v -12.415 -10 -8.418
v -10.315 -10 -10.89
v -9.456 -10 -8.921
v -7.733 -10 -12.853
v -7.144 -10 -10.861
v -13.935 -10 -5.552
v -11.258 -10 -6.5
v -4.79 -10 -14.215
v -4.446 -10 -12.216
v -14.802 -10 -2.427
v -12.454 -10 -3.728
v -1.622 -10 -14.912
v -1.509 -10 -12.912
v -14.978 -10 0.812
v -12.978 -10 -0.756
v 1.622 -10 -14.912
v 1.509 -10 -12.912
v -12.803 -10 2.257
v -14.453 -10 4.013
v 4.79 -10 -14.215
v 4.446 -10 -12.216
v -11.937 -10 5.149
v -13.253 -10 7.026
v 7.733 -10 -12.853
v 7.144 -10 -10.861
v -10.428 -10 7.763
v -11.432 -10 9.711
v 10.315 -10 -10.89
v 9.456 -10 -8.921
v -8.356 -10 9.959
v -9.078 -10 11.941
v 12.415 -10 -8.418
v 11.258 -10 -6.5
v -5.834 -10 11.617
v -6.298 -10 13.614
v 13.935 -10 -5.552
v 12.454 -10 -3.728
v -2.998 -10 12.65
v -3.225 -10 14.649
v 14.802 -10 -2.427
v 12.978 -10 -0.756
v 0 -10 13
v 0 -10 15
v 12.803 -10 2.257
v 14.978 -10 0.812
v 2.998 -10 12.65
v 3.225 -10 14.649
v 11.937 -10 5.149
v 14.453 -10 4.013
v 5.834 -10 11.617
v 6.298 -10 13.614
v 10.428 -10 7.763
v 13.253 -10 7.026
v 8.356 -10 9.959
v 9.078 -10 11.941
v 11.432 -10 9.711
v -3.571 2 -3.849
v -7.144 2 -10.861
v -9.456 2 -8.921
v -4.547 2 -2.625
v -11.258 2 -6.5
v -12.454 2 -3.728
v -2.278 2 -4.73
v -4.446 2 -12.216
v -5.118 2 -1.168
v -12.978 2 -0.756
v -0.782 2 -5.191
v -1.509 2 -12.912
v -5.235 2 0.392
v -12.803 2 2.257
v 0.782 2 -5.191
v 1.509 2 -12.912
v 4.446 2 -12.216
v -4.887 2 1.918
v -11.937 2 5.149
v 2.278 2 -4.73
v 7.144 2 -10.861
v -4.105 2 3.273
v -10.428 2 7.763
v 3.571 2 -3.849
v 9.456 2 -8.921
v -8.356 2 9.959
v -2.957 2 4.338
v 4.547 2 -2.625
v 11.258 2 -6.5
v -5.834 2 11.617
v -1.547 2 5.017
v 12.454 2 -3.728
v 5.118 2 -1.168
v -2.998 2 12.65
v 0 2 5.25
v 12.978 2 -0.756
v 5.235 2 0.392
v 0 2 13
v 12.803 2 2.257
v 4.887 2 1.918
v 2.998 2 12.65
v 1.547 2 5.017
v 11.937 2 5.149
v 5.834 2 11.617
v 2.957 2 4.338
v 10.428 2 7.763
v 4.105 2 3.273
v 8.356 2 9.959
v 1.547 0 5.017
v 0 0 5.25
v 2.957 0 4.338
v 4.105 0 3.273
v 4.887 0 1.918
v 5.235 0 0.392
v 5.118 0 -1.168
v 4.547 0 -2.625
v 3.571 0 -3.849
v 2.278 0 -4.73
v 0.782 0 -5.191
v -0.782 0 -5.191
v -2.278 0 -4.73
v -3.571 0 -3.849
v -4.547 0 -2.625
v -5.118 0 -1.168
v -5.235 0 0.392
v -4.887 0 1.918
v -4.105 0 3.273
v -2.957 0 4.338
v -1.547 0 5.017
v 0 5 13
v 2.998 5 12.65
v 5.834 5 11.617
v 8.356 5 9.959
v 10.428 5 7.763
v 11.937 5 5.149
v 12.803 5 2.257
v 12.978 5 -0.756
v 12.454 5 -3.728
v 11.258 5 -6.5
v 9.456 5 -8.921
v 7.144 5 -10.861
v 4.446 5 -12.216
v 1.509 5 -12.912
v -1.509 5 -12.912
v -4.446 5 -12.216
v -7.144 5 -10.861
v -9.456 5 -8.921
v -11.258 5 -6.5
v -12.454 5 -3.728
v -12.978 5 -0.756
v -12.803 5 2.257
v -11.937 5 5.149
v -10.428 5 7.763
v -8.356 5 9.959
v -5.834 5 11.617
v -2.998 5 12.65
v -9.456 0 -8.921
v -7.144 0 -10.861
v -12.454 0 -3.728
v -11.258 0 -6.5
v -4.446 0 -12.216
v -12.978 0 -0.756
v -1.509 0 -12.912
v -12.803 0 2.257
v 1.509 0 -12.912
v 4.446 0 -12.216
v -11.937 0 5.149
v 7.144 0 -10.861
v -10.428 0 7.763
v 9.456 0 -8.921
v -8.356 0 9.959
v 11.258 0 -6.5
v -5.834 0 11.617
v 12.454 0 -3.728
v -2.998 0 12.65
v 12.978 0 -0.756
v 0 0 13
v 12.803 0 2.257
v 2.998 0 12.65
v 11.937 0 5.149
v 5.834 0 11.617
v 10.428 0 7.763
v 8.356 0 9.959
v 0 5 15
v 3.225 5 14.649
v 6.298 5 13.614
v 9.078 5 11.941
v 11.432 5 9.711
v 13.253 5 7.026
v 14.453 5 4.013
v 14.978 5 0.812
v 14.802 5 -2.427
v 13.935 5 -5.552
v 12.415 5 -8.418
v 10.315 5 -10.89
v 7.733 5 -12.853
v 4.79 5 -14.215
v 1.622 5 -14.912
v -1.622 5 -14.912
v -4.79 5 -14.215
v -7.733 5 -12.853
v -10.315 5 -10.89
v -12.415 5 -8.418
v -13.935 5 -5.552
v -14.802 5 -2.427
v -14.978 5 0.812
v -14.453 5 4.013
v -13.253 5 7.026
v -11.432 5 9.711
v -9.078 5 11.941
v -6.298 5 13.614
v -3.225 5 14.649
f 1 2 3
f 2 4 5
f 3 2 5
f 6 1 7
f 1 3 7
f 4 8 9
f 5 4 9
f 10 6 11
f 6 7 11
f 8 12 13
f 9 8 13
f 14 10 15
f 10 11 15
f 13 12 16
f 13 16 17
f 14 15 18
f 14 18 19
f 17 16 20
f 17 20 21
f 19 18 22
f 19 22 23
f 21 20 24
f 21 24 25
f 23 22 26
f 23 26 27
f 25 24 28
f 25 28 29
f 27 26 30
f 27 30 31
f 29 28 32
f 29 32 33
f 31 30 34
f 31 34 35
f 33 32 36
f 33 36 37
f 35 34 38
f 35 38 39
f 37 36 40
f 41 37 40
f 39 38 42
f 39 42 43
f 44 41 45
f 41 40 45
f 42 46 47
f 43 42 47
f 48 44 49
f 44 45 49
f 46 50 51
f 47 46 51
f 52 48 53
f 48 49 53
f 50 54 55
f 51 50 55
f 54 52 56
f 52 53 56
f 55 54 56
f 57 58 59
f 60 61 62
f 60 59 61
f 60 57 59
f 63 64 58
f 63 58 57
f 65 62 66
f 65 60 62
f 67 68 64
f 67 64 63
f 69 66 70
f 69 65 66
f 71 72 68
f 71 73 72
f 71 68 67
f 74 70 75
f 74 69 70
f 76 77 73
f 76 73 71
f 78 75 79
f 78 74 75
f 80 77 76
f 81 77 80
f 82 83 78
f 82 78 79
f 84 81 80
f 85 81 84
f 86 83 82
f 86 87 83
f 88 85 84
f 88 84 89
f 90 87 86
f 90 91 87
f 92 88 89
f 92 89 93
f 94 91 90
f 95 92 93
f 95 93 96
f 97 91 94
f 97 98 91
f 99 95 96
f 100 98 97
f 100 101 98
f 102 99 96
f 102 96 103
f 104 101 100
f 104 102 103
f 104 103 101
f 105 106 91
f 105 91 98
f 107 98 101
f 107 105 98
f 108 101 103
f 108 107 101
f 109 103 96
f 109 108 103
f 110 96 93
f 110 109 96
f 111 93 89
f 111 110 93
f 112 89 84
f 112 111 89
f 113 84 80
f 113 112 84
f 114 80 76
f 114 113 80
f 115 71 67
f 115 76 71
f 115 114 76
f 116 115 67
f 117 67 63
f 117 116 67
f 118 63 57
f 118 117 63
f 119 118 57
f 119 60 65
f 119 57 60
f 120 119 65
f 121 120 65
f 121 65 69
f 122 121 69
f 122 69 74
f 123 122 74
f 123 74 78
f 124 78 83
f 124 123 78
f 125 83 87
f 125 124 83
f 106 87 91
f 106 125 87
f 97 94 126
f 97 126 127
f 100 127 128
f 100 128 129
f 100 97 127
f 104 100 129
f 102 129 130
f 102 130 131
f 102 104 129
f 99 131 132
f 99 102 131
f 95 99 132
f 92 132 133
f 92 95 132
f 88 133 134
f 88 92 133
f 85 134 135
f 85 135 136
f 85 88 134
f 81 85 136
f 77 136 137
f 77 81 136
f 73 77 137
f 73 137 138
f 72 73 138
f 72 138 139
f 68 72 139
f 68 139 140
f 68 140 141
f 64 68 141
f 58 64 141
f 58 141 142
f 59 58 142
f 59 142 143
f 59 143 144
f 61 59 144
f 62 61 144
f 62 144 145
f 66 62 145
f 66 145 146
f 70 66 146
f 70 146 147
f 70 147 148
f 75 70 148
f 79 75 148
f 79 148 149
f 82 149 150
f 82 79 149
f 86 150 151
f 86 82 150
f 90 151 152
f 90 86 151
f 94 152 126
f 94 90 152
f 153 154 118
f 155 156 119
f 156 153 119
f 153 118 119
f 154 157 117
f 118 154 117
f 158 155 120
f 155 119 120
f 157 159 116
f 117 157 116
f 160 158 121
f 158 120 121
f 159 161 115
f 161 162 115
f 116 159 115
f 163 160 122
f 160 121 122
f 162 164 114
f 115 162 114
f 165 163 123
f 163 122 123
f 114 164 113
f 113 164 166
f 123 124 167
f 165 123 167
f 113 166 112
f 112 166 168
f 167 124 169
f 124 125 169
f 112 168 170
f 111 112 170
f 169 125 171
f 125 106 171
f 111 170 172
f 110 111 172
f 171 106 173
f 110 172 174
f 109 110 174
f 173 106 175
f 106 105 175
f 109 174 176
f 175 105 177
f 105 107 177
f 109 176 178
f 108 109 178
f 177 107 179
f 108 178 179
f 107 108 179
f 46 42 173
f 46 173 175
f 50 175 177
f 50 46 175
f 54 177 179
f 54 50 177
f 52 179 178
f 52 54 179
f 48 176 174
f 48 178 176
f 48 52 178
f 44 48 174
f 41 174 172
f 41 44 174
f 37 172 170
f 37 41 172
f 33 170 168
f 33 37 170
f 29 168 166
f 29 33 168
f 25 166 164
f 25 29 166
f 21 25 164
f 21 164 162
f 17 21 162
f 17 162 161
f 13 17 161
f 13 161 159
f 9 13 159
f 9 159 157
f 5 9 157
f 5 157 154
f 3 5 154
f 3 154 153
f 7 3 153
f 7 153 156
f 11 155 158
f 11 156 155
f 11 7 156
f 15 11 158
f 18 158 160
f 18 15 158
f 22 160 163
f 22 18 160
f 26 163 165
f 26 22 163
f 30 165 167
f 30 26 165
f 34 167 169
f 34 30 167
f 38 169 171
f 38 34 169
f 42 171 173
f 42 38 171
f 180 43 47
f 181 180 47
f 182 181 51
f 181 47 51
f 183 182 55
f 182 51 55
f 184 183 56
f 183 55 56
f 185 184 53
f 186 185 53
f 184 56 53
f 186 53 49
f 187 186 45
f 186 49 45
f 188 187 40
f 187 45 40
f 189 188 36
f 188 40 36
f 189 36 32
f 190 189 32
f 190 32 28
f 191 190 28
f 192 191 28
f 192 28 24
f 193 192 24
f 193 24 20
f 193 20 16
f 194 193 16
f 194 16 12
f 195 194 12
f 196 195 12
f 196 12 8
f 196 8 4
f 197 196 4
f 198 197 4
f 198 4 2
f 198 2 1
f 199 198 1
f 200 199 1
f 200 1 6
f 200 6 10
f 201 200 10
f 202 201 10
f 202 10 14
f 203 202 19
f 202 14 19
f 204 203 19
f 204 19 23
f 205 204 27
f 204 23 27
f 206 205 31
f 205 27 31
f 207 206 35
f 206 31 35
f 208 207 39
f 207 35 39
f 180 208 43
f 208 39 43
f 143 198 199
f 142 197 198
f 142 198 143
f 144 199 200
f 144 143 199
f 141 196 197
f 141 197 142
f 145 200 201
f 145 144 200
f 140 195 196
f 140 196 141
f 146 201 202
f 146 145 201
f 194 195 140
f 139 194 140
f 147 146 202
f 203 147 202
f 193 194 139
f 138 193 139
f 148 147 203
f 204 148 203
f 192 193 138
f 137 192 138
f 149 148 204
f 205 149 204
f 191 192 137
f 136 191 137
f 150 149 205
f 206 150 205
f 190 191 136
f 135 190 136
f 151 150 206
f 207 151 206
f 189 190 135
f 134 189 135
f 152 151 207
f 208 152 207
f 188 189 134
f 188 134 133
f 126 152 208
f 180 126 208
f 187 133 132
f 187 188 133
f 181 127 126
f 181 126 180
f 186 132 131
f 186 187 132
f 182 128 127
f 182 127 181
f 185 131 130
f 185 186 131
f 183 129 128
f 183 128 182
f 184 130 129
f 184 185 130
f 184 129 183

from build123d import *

# Parameters (mm, degrees)
BOSS_EXTRUDE1_DEPTH      = 5
BOSS_EXTRUDE1_DEPTH_BACK = 10
SKETCH1_R                = 15
SKETCH1_R_2              = 13
SKETCH2_R                = 15
BOSS_EXTRUDE2_DEPTH      = 2
CUT_EXTRUDE1_DEPTH       = 24.452078799
CUT_EXTRUDE1_DEPTH_BACK  = 24.452078799
SKETCH3_R                = 5.25


with BuildPart() as part:
    # Sketch1 → Boss-Extrude1 (new, two sides: drawn at the far end of the back side and taken through both)
    with BuildSketch(Plane(origin=(0, 0, 0), x_dir=(1, 0, 0), z_dir=(0, 1, 0)).offset(-BOSS_EXTRUDE1_DEPTH_BACK)):
        with Locations(Location((0, 0, 0), (0, 0, 270))):
            Circle(SKETCH1_R)
        with Locations(Location((0, 0, 0), (0, 0, 270))):
            Circle(SKETCH1_R_2, mode=Mode.SUBTRACT)
    extrude(amount=BOSS_EXTRUDE1_DEPTH + BOSS_EXTRUDE1_DEPTH_BACK)

    # Sketch2 → Boss-Extrude2 (add)
    with BuildSketch(Plane(origin=(0, 0, 0), x_dir=(1, 0, 0), z_dir=(0, 1, 0))):
        with Locations(Location((0, 0, 0), (0, 0, 270))):
            Circle(SKETCH2_R)
    extrude(amount=BOSS_EXTRUDE2_DEPTH)

    # Sketch3 → Cut-Extrude1 (cut, two sides: drawn at the far end of the back side and taken through both)
    with BuildSketch(Plane(origin=(0, 0, 0), x_dir=(1, 0, 0), z_dir=(0, 1, 0)).offset(-CUT_EXTRUDE1_DEPTH_BACK)):
        with Locations(Location((0, 0, 0), (0, 0, 270))):
            Circle(SKETCH3_R)
    extrude(amount=CUT_EXTRUDE1_DEPTH + CUT_EXTRUDE1_DEPTH_BACK, mode=Mode.SUBTRACT)


solid = part.part
